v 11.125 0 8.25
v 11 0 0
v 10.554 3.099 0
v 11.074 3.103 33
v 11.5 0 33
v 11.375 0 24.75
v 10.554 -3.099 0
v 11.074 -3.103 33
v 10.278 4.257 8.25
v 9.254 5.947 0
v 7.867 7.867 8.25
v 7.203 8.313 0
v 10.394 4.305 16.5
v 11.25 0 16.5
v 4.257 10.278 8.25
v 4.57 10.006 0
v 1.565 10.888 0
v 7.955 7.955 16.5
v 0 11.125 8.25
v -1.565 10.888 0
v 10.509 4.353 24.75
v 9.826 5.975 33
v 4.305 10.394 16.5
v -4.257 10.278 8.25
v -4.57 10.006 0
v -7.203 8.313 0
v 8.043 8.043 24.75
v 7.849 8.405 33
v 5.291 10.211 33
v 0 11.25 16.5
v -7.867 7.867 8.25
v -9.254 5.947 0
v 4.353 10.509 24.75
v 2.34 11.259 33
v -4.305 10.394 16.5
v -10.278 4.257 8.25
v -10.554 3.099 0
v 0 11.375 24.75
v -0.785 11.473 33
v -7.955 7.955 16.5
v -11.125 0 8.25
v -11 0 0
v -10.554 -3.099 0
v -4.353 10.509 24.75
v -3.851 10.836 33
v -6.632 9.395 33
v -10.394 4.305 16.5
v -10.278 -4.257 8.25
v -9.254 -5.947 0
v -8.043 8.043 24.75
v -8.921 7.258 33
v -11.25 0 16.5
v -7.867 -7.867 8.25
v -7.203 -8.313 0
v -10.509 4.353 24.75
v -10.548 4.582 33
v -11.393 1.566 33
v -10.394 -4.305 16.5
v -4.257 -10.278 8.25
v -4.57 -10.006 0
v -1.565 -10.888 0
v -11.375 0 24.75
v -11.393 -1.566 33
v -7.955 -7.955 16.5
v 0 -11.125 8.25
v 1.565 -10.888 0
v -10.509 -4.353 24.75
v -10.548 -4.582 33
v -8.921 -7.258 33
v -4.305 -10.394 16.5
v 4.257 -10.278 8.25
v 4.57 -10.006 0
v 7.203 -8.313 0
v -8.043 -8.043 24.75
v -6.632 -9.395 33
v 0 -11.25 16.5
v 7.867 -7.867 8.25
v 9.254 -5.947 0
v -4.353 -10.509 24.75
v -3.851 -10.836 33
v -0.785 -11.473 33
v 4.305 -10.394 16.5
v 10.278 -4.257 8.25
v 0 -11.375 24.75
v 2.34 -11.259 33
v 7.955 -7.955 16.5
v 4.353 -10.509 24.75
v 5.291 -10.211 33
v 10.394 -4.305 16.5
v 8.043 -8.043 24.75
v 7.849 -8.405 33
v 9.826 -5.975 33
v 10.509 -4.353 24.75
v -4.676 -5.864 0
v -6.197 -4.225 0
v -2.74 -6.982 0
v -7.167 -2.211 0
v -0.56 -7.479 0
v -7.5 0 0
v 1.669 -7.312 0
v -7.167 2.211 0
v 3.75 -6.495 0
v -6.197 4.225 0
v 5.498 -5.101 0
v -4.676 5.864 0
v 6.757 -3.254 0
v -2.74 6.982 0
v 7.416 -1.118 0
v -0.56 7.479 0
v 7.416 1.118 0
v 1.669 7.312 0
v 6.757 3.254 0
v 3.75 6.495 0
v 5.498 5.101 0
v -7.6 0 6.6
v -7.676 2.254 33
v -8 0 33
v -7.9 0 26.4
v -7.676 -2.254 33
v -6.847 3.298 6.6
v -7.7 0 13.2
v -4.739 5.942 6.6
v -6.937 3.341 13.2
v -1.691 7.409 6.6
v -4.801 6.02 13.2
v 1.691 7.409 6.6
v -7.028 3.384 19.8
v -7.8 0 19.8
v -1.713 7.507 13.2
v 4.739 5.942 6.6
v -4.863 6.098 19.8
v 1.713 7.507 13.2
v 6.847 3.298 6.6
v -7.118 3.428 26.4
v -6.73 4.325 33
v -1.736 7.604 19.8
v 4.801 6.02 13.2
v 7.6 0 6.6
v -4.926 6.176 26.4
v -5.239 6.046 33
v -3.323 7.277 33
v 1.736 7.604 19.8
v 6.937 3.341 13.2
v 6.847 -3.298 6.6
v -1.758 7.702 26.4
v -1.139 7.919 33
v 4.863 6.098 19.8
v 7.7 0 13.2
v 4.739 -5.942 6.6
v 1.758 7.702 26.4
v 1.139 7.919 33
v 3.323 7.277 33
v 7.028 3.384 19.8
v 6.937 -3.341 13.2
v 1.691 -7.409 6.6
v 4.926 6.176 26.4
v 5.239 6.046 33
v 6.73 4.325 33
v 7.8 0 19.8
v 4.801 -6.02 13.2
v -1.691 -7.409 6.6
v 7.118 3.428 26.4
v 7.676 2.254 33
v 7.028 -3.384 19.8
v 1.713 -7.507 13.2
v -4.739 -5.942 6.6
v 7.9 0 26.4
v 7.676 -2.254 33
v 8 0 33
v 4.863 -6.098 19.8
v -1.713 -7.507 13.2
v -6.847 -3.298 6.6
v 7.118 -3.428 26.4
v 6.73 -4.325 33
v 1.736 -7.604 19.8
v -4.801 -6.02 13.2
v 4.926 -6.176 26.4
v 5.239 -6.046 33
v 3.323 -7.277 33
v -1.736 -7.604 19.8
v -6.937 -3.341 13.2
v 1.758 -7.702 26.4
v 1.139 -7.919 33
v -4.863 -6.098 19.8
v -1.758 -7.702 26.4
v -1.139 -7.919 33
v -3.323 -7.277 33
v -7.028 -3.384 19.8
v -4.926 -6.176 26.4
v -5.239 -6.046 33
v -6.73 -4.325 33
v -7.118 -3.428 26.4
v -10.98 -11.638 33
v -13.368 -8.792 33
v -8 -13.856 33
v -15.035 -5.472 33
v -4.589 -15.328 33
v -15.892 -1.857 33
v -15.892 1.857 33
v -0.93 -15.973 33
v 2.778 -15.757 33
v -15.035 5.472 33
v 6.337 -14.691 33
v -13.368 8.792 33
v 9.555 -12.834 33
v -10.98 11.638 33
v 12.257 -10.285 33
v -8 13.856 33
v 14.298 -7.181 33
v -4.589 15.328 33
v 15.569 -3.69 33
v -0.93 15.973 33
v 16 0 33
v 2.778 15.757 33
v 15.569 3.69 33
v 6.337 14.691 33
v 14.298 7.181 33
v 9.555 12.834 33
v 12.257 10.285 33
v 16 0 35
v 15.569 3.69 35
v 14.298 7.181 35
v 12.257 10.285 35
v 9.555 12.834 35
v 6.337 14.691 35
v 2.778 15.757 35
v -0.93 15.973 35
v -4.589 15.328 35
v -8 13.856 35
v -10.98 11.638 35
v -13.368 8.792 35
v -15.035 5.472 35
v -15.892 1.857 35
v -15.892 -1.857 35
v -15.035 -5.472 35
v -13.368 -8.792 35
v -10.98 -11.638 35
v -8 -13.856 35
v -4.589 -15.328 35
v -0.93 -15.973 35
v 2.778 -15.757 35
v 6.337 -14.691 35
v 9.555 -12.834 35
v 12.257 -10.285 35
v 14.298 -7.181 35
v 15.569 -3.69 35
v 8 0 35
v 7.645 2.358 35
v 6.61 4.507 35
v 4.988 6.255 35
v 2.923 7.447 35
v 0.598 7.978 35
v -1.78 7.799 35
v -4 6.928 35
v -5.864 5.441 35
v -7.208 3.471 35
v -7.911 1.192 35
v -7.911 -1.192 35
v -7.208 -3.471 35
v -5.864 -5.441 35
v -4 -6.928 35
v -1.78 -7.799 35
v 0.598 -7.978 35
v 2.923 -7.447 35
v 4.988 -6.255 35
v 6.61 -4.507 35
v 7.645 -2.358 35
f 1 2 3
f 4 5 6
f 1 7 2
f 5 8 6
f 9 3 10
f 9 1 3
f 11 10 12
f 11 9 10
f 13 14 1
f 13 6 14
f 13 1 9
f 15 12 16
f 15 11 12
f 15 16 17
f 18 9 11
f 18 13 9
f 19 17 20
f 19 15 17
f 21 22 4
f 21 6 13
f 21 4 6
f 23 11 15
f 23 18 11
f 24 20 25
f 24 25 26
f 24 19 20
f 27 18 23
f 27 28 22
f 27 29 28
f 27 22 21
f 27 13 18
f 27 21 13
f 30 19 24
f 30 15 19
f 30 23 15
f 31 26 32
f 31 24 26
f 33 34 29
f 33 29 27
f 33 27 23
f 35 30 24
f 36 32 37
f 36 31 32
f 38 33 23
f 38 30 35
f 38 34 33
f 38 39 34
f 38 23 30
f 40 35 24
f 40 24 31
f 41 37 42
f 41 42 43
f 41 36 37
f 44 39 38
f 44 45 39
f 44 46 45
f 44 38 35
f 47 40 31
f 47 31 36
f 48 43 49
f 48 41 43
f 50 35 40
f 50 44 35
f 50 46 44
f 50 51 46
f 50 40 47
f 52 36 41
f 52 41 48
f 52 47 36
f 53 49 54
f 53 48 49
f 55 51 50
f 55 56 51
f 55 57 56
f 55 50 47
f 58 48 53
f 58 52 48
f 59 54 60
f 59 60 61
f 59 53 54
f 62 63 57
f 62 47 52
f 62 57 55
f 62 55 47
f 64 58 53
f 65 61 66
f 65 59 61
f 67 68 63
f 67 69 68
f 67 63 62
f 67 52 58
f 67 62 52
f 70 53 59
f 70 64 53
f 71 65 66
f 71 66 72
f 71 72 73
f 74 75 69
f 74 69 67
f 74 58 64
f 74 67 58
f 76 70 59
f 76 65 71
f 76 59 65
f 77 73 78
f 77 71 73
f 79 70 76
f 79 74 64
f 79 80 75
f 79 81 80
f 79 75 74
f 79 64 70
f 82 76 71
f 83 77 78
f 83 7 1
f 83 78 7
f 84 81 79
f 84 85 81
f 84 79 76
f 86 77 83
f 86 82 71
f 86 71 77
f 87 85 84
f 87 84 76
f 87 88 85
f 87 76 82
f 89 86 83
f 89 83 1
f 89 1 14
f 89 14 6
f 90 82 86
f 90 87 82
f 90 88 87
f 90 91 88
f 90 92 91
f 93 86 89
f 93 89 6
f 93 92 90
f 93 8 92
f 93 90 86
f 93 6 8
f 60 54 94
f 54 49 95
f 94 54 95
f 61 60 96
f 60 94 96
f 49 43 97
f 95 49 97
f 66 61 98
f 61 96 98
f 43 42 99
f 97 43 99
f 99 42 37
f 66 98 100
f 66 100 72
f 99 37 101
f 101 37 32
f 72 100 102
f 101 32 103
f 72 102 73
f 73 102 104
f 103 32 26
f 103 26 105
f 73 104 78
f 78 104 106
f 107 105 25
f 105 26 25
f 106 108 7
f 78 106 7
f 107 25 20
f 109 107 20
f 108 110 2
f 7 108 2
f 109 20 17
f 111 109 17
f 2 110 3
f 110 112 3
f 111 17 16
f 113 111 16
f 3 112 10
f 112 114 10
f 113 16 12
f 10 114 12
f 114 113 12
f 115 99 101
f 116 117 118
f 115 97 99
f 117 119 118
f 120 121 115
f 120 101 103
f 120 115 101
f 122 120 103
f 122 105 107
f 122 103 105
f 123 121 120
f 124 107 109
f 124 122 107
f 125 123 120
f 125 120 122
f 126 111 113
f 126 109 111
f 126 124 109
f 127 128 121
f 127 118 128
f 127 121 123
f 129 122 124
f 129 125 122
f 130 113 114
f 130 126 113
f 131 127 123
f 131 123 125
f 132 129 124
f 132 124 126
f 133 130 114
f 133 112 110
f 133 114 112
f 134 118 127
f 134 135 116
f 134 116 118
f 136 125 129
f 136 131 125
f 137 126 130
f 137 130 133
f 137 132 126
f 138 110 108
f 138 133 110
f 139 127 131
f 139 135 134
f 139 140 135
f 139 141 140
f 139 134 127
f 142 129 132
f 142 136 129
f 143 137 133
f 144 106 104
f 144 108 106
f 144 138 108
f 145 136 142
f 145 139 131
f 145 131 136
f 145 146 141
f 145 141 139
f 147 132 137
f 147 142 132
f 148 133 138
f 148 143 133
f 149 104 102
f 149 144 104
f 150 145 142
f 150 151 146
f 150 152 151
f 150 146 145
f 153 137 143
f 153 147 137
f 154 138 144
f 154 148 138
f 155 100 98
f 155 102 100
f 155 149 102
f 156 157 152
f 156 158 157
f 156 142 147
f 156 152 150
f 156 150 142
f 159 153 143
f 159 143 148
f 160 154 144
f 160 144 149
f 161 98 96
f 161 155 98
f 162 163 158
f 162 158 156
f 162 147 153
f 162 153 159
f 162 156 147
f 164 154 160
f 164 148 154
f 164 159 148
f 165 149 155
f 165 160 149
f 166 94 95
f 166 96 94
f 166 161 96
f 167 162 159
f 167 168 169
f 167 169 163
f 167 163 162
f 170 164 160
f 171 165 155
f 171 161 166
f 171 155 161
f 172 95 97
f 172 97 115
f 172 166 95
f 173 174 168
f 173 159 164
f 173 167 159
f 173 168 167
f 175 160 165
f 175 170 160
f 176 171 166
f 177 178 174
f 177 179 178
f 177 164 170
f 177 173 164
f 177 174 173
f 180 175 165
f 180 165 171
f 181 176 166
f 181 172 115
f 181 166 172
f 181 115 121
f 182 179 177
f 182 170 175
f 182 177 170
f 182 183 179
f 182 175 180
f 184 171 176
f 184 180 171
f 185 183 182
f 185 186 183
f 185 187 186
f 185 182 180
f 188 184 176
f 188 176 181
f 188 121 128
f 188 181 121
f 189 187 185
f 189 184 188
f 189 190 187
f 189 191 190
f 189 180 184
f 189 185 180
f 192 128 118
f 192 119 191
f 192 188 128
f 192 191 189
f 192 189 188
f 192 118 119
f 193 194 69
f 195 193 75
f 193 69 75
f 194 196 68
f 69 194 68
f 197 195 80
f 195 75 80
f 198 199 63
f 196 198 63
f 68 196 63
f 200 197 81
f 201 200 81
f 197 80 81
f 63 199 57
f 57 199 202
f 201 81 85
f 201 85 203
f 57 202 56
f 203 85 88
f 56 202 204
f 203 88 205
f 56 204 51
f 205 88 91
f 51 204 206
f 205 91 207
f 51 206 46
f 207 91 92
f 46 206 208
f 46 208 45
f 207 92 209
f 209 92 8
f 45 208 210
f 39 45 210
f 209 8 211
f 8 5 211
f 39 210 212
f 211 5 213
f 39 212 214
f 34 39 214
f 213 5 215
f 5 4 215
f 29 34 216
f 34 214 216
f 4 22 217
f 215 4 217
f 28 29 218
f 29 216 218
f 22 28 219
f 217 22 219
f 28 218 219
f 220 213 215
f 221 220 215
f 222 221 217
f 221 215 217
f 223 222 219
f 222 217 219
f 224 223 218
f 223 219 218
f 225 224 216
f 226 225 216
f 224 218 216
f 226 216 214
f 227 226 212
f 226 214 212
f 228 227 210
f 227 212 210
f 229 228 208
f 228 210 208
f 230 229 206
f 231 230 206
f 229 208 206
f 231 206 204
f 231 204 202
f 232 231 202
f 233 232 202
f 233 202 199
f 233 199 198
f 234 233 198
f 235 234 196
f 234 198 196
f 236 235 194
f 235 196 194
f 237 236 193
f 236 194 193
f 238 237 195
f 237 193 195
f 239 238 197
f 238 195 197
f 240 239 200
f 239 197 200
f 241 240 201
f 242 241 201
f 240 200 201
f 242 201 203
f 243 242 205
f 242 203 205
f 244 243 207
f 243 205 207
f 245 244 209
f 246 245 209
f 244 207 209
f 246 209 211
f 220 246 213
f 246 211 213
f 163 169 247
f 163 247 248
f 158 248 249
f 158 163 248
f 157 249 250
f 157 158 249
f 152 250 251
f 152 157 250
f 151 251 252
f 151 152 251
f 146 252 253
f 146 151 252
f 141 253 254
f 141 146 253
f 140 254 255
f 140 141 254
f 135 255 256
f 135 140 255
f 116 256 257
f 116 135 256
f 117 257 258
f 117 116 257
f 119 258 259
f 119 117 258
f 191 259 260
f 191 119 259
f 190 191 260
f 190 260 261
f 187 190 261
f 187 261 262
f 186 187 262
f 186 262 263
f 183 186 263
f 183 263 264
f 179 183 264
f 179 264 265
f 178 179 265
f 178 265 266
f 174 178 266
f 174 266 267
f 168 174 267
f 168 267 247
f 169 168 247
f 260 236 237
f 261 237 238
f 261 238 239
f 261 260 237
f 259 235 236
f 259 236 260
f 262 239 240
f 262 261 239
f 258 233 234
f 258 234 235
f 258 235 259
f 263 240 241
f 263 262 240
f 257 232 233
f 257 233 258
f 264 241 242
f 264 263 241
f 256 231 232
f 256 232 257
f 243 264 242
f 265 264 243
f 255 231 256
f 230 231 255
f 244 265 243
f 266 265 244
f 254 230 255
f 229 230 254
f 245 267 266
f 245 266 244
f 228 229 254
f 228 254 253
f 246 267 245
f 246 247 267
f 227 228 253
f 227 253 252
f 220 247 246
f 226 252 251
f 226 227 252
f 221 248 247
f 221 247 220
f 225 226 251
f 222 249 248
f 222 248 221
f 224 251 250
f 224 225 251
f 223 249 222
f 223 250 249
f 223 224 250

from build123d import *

# Parameters (mm, degrees)
CROQUIS1_R              = 11
CROQUIS3_R              = 11.5
CROQUIS4_R              = 7.5
CROQUIS5_R              = 8
CROQUIS6_R              = 16
CROQUIS6_R_2            = 8
SALIENTE_EXTRUIR1_DEPTH = 2


with BuildPart() as part:
    # Croquis1 → Recubrir1 section 0
    with BuildSketch(Plane.XY):
        Circle(CROQUIS1_R)
    # Croquis3 → Recubrir1 section 1
    with BuildSketch(Plane.XY.offset(33)):
        Circle(CROQUIS3_R)
    loft()

    # Croquis4 → Cortar-Recubrir1 section 0
    with BuildSketch(Plane(origin=(0, 0, 0), x_dir=(-1, 0, 0), z_dir=(0, 0, -1))):
        Circle(CROQUIS4_R)
    # Croquis5 → Cortar-Recubrir1 section 1
    with BuildSketch(Plane.XY.offset(33)):
        Circle(CROQUIS5_R)
    loft(mode=Mode.SUBTRACT)

    # Croquis6 → Saliente-Extruir1 (add)
    with BuildSketch(Plane.XY.offset(33)):
        Circle(CROQUIS6_R)
        Circle(CROQUIS6_R_2, mode=Mode.SUBTRACT)
    extrude(amount=SALIENTE_EXTRUIR1_DEPTH)


solid = part.part
